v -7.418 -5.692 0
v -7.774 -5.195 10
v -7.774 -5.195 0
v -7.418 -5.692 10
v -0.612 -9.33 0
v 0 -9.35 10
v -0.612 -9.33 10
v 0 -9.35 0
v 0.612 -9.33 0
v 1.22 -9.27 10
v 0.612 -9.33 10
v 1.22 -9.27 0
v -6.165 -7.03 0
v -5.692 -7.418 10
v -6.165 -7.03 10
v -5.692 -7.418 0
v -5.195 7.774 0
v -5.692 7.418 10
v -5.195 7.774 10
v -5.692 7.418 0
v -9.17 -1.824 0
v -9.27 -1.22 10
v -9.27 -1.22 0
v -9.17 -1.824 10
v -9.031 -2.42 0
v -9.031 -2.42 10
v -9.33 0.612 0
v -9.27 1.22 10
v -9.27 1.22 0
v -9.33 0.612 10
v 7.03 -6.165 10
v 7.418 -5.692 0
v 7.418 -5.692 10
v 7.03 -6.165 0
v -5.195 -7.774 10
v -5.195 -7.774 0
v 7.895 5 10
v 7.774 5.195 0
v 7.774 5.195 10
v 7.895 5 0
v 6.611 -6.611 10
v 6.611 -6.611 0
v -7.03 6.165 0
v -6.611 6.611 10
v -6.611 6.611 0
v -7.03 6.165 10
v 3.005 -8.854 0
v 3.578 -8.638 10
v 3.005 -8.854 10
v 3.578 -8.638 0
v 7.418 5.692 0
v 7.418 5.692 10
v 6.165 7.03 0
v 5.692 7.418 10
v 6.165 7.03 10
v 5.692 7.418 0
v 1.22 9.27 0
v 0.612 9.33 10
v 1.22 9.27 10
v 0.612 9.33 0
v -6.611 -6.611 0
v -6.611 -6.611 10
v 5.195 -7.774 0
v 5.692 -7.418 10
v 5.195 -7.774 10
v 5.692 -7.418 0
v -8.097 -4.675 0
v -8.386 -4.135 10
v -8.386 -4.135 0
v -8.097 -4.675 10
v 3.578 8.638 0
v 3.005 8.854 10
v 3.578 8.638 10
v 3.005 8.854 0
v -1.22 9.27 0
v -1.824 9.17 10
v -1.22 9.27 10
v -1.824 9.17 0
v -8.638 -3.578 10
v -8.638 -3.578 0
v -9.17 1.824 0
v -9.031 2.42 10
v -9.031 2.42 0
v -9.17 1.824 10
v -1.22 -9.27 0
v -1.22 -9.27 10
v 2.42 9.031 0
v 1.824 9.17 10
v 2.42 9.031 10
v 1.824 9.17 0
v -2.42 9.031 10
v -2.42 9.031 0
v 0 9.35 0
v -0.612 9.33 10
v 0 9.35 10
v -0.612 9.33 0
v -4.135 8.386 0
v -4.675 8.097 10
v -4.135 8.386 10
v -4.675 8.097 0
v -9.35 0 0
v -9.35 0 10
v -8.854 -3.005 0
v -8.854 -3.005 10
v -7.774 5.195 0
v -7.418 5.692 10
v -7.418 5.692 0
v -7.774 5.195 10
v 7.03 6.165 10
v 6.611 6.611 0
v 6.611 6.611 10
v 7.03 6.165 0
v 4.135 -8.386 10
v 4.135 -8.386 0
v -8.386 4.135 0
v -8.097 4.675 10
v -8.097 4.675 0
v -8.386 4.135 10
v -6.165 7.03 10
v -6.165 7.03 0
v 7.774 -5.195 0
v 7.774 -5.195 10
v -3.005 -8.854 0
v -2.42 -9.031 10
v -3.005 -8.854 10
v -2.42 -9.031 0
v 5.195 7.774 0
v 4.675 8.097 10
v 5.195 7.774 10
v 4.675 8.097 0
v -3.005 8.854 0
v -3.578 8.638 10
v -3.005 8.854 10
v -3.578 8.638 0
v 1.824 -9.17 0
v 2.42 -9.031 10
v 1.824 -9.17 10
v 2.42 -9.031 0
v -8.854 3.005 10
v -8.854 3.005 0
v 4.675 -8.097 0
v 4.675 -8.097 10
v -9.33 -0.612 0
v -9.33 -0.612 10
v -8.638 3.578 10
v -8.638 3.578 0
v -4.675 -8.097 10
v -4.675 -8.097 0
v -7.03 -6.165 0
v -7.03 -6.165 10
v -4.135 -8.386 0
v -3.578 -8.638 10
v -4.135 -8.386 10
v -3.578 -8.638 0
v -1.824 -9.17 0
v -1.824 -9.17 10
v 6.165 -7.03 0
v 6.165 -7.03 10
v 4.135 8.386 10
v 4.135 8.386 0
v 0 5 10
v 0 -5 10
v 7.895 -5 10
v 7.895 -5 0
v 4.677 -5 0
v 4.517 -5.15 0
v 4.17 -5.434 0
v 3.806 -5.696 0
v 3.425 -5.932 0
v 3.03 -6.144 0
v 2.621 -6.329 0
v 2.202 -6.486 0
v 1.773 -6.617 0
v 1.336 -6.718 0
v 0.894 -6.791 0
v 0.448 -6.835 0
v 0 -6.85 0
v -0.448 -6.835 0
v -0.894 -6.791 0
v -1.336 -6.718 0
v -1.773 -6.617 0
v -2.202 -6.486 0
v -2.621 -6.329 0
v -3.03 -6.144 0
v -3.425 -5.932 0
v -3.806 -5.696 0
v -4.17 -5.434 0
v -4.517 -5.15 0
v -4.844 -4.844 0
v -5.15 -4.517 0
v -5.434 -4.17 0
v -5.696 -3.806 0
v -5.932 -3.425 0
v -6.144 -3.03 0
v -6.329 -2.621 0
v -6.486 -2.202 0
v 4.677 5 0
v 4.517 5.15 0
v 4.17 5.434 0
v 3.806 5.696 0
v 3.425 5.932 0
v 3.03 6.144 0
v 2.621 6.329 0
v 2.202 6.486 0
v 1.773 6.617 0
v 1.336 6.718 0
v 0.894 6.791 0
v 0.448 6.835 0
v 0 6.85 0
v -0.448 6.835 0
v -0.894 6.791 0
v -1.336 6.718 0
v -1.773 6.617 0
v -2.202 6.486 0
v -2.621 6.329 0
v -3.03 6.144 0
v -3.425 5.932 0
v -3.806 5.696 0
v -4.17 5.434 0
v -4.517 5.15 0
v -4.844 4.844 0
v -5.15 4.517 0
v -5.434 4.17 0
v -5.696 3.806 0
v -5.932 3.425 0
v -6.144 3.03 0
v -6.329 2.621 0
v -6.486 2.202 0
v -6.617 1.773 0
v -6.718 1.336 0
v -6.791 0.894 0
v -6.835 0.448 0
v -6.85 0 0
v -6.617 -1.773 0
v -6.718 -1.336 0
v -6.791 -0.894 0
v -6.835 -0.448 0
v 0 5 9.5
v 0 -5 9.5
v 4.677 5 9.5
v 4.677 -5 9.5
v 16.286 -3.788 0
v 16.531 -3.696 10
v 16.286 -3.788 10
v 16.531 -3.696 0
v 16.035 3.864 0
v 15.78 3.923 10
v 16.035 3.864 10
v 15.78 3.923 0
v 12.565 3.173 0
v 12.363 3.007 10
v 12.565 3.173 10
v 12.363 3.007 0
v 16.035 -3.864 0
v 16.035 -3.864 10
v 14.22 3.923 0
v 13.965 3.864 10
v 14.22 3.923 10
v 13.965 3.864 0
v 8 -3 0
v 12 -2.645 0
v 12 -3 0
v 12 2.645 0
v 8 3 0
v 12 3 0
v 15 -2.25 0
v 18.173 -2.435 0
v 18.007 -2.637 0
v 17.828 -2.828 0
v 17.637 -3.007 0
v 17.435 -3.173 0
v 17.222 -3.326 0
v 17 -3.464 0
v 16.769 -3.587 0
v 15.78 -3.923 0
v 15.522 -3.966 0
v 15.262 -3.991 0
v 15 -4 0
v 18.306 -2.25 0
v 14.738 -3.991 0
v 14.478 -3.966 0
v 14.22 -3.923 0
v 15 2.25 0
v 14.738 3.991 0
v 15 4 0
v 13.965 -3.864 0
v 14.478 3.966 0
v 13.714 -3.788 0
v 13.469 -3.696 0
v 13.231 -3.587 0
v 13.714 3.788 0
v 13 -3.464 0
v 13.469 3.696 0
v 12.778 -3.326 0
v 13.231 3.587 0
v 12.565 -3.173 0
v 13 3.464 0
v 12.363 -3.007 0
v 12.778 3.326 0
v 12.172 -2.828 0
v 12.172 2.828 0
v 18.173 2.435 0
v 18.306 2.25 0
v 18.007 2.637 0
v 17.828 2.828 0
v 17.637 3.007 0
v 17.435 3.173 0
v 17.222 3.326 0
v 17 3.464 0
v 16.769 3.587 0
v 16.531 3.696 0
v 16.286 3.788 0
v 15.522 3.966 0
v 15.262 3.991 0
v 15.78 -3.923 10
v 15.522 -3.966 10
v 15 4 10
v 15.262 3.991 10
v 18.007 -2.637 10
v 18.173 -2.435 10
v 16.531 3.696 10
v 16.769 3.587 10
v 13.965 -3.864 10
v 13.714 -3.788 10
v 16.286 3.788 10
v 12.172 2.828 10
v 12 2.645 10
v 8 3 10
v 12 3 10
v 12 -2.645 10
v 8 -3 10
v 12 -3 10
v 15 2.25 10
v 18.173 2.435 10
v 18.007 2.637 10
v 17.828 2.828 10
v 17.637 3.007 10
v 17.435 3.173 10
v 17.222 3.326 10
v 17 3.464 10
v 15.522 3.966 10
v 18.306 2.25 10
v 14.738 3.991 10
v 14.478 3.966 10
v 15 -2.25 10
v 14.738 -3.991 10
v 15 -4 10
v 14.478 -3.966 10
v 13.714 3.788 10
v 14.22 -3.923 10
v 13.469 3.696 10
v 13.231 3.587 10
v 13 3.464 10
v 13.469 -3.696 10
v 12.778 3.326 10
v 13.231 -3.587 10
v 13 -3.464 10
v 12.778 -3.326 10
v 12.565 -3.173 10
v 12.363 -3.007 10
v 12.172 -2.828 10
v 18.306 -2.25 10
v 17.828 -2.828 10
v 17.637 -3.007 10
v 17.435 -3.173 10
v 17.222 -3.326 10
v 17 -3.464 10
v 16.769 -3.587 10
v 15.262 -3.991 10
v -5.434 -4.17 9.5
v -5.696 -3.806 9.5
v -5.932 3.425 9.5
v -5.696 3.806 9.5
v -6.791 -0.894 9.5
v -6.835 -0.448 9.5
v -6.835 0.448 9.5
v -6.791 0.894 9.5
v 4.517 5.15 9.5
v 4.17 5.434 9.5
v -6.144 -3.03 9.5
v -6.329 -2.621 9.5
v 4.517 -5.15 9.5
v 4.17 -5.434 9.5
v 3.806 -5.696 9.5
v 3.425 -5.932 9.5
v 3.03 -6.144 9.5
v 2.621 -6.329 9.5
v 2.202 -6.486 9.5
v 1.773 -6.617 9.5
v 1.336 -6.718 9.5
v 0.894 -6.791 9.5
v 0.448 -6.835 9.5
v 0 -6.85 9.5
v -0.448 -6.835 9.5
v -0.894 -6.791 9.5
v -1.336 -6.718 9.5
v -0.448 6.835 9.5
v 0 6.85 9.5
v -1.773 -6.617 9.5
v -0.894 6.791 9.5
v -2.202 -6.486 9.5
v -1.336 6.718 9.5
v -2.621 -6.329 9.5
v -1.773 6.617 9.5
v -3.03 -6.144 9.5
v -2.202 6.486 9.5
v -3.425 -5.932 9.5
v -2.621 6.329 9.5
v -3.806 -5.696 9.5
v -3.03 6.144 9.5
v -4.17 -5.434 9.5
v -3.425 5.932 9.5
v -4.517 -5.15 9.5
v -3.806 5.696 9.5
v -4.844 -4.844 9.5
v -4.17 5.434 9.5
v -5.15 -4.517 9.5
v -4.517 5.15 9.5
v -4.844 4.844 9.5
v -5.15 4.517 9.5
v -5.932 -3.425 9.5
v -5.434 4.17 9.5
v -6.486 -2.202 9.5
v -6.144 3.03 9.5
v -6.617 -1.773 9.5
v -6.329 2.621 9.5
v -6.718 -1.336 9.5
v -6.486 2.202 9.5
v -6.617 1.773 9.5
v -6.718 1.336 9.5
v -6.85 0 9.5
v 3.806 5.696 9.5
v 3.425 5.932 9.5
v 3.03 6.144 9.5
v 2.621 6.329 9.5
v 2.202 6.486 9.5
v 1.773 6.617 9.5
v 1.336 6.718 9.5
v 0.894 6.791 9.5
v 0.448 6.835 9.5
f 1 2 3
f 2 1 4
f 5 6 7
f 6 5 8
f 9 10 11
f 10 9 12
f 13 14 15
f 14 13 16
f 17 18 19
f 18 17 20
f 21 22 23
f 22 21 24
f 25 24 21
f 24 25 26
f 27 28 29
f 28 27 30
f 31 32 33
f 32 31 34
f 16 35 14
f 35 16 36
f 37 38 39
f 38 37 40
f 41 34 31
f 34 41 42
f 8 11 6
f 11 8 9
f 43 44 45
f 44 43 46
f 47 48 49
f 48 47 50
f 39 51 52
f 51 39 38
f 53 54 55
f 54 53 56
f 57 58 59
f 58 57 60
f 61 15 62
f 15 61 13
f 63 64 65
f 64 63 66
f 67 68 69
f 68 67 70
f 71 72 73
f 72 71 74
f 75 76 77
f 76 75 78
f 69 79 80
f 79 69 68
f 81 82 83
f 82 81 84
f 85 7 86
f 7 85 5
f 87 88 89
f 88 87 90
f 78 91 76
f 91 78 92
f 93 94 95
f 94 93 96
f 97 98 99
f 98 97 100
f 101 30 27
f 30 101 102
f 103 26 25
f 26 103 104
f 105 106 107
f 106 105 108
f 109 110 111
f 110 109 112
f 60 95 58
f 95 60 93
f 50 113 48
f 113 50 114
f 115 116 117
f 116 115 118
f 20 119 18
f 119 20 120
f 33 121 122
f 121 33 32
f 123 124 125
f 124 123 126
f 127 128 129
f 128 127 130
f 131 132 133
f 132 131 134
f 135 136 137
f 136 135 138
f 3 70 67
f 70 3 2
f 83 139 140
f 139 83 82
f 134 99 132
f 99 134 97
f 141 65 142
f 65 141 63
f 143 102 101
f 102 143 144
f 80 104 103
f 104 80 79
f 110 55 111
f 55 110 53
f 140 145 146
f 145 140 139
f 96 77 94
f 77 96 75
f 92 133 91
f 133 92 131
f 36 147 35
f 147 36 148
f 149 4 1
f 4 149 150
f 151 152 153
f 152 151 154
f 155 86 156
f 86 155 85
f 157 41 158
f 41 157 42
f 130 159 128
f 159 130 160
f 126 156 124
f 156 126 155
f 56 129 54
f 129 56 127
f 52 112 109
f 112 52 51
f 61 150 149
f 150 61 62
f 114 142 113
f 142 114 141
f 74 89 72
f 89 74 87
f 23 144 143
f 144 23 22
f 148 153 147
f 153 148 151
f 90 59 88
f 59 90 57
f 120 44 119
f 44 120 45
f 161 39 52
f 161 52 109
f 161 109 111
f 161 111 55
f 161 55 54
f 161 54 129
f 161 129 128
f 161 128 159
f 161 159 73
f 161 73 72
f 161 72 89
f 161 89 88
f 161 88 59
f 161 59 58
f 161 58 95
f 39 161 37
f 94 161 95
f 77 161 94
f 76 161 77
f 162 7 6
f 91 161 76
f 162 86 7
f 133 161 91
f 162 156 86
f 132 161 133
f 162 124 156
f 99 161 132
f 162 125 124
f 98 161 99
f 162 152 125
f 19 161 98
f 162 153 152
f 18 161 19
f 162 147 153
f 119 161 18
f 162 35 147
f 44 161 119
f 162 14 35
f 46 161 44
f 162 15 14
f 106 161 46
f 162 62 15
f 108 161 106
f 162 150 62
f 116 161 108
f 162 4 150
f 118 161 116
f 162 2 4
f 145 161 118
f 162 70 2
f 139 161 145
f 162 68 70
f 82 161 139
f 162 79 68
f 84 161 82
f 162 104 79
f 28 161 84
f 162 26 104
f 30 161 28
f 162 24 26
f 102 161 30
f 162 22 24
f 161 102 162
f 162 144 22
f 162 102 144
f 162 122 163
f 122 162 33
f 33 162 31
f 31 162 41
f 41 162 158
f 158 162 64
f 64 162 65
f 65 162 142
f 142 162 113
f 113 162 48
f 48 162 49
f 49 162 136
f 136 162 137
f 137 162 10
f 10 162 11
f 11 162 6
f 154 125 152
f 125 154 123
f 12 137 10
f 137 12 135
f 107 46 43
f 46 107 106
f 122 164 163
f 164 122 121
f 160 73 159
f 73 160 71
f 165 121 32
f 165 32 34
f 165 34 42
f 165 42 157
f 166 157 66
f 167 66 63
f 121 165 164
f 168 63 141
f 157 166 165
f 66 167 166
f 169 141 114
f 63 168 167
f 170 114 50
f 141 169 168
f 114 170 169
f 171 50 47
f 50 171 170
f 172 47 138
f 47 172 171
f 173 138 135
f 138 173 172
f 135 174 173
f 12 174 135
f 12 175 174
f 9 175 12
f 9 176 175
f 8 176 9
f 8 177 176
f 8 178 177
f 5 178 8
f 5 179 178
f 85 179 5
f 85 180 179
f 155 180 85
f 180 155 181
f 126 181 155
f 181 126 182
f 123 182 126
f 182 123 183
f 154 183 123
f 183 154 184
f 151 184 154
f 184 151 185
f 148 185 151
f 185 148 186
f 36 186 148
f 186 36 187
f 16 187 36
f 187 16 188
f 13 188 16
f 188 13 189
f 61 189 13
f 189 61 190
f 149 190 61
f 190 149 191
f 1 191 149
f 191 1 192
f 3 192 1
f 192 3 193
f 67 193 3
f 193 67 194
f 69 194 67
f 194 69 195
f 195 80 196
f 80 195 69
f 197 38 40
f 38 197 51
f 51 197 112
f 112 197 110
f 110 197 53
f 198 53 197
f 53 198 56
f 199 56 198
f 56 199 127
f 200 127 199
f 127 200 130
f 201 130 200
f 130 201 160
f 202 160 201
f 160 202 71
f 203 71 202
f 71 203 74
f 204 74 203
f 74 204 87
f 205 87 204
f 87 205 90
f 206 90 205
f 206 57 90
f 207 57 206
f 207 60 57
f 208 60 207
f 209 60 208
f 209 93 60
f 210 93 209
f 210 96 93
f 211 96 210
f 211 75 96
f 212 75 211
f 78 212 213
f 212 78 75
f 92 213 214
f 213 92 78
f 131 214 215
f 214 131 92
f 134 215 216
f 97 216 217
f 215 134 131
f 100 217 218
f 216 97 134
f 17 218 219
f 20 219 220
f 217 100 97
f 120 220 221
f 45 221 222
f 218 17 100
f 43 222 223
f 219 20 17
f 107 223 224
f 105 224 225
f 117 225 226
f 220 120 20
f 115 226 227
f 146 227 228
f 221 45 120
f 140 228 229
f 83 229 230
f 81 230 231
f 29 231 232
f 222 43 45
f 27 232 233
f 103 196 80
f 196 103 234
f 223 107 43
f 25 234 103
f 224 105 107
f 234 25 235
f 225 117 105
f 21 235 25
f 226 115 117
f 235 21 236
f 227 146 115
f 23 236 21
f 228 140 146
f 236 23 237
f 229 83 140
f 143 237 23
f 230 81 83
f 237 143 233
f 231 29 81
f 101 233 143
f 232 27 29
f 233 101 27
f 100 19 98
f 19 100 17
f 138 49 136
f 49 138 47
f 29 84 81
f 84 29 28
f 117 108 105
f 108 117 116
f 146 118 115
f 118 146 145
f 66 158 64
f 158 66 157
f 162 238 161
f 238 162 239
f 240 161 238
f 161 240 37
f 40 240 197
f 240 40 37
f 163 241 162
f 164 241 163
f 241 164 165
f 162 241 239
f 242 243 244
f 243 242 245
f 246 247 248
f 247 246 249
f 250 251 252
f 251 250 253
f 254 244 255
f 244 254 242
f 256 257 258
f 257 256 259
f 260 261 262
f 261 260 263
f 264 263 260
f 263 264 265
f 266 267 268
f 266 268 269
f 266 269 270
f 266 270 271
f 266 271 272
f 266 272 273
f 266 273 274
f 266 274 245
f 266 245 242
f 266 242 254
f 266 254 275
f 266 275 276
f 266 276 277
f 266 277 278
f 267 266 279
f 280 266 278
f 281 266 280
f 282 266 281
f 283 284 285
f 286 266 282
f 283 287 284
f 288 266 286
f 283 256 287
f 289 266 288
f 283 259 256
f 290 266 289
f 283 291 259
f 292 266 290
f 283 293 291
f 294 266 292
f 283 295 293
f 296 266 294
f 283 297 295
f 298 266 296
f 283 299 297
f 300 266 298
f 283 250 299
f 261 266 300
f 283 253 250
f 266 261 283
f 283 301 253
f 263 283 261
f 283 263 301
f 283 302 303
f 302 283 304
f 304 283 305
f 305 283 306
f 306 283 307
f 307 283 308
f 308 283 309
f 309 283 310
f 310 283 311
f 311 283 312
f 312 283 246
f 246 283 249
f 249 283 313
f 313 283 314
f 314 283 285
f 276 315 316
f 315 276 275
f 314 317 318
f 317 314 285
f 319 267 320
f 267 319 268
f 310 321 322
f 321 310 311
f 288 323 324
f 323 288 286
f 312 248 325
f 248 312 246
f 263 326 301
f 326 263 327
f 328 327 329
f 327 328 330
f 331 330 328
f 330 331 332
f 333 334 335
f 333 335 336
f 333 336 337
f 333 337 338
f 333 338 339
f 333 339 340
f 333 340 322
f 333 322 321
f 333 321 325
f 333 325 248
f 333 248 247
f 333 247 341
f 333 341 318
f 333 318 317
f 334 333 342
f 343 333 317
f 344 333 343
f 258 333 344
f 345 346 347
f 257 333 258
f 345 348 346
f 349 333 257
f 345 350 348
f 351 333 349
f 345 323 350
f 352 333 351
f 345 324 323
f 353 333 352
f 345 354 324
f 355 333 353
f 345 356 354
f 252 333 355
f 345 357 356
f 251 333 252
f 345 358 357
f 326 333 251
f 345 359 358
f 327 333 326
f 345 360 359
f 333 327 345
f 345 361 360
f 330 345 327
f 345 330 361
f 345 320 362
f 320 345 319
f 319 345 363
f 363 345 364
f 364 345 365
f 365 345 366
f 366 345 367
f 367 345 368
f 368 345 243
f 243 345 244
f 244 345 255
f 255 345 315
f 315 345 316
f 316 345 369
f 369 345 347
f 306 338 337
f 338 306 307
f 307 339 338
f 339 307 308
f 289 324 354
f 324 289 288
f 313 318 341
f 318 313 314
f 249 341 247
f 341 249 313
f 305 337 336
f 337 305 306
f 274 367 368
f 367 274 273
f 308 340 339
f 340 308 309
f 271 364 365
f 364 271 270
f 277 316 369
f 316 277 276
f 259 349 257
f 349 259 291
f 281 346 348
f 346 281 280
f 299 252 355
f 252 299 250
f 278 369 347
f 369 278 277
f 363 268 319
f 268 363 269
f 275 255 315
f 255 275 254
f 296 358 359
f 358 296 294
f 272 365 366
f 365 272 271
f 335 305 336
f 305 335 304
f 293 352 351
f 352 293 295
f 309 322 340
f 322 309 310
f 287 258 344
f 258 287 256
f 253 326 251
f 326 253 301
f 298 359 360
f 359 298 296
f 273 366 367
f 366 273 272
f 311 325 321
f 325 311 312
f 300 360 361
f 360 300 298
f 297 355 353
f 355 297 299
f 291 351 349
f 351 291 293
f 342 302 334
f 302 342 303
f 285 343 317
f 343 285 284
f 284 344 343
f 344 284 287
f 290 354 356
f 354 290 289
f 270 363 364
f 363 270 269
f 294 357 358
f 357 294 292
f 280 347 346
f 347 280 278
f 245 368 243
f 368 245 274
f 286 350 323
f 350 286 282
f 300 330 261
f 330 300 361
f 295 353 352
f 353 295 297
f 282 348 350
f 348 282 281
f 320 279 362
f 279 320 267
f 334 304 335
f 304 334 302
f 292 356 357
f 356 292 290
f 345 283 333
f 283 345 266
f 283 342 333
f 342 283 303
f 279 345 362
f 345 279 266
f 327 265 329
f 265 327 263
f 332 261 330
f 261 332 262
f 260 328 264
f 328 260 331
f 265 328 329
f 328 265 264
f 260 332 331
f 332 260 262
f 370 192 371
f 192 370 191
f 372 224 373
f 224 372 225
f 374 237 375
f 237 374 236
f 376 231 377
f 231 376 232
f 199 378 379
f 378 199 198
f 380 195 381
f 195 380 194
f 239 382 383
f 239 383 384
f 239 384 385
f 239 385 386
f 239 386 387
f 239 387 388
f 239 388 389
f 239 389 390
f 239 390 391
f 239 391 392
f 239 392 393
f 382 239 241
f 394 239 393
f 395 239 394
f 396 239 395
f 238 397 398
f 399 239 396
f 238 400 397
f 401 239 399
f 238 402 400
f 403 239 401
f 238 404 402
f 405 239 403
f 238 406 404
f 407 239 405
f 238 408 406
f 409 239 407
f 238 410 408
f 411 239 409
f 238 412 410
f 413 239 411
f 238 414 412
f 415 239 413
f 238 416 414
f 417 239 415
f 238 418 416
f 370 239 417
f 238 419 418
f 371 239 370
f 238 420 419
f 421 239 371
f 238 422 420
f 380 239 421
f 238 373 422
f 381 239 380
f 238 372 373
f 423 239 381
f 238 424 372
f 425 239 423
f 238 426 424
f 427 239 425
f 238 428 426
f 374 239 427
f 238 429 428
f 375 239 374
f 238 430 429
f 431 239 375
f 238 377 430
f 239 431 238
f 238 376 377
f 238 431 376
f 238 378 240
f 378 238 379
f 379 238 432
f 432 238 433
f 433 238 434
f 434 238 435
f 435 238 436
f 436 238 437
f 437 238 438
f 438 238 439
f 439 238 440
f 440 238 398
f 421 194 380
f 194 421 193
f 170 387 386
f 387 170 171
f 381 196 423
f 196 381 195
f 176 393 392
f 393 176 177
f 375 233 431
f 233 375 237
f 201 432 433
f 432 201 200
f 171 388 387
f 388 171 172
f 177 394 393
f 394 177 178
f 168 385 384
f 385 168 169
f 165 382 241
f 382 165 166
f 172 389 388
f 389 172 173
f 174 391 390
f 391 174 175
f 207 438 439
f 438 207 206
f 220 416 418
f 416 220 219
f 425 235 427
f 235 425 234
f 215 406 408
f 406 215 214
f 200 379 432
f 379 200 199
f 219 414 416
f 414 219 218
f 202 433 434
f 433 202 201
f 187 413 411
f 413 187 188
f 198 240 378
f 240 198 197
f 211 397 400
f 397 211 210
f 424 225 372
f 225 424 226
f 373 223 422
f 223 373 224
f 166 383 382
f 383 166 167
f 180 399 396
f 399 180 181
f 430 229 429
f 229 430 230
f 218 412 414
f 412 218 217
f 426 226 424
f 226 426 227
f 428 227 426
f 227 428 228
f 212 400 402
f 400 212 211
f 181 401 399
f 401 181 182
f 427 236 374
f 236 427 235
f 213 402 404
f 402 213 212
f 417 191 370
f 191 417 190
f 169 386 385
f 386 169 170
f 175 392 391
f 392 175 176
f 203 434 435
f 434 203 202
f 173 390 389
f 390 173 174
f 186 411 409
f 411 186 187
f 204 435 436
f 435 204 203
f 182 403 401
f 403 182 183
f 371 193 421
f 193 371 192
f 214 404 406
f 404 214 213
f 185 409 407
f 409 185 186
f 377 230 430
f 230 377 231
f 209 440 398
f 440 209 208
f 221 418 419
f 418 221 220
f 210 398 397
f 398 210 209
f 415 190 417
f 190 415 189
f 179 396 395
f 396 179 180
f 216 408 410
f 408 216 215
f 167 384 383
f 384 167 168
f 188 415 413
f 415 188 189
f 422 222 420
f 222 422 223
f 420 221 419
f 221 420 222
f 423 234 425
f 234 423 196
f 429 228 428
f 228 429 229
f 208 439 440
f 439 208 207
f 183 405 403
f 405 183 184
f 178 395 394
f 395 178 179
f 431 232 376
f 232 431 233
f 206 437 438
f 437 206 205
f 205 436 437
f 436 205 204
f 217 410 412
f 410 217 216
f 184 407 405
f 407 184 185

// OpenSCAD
// Snap-on clip for tubing next to a 12.7 mm lab stand rod
// Print orientation: flat on bed, extruded upward in +Z

$fn = 96;

// ---- Dimensions (mm) ----
ring_od        = 18.7;   // rod ring outer diameter
ring_id        = 12.7;   // rod ring inner diameter (rod bore)
ring_wall      = 3;      // rod ring wall thickness
ring_open      = 10;     // rod ring opening width (along -X)

tube_od        = 8;      // tubing ring outer diameter
tube_id        = 6;      // tubing ring inner diameter
tube_wall      = 2;      // tubing ring wall thickness
tube_open      = 4.5;    // tubing opening width (along +X)

bridge_x0      = 8;      // bridge start (X)
bridge_x1      = 12;     // bridge end (X)
bridge_w       = 6;      // bridge width (Y)

eps            = 0.5;    // cutter overshoot past faces
standoff       = 0.5;    // ring centre offset from rod surface

// ---- Derived ----
ring_r = ring_od / 2;
tube_r = tube_od / 2;

difference() {
    union() {
        // Rod ring
        difference() {
            cylinder(h = 10, r = ring_r);
            // Opening cut from -X side
            translate([0, -ring_open / 2, -eps])
                cube([ring_r + eps, ring_open, 10 + 2 * eps]);
        }

        // Tubing ring
        translate([15, 0, 0])
            difference() {
                cylinder(h = 10, r = tube_r);
                // Opening cut from +X side
                translate([0, -tube_open / 2, -eps])
                    cube([tube_r + eps, tube_open, 10 + 2 * eps]);
            }

        // Solid bridge between rings
        translate([bridge_x0, -bridge_w / 2, 0])
            cube([bridge_x1 - bridge_x0, bridge_w, 10]);
    }

    // Rod stand bore (12.7 mm rod + standoff clearance)
    translate([0, 0, -eps])
        cylinder(h = 10, r = ring_id / 2 + standoff);
}
